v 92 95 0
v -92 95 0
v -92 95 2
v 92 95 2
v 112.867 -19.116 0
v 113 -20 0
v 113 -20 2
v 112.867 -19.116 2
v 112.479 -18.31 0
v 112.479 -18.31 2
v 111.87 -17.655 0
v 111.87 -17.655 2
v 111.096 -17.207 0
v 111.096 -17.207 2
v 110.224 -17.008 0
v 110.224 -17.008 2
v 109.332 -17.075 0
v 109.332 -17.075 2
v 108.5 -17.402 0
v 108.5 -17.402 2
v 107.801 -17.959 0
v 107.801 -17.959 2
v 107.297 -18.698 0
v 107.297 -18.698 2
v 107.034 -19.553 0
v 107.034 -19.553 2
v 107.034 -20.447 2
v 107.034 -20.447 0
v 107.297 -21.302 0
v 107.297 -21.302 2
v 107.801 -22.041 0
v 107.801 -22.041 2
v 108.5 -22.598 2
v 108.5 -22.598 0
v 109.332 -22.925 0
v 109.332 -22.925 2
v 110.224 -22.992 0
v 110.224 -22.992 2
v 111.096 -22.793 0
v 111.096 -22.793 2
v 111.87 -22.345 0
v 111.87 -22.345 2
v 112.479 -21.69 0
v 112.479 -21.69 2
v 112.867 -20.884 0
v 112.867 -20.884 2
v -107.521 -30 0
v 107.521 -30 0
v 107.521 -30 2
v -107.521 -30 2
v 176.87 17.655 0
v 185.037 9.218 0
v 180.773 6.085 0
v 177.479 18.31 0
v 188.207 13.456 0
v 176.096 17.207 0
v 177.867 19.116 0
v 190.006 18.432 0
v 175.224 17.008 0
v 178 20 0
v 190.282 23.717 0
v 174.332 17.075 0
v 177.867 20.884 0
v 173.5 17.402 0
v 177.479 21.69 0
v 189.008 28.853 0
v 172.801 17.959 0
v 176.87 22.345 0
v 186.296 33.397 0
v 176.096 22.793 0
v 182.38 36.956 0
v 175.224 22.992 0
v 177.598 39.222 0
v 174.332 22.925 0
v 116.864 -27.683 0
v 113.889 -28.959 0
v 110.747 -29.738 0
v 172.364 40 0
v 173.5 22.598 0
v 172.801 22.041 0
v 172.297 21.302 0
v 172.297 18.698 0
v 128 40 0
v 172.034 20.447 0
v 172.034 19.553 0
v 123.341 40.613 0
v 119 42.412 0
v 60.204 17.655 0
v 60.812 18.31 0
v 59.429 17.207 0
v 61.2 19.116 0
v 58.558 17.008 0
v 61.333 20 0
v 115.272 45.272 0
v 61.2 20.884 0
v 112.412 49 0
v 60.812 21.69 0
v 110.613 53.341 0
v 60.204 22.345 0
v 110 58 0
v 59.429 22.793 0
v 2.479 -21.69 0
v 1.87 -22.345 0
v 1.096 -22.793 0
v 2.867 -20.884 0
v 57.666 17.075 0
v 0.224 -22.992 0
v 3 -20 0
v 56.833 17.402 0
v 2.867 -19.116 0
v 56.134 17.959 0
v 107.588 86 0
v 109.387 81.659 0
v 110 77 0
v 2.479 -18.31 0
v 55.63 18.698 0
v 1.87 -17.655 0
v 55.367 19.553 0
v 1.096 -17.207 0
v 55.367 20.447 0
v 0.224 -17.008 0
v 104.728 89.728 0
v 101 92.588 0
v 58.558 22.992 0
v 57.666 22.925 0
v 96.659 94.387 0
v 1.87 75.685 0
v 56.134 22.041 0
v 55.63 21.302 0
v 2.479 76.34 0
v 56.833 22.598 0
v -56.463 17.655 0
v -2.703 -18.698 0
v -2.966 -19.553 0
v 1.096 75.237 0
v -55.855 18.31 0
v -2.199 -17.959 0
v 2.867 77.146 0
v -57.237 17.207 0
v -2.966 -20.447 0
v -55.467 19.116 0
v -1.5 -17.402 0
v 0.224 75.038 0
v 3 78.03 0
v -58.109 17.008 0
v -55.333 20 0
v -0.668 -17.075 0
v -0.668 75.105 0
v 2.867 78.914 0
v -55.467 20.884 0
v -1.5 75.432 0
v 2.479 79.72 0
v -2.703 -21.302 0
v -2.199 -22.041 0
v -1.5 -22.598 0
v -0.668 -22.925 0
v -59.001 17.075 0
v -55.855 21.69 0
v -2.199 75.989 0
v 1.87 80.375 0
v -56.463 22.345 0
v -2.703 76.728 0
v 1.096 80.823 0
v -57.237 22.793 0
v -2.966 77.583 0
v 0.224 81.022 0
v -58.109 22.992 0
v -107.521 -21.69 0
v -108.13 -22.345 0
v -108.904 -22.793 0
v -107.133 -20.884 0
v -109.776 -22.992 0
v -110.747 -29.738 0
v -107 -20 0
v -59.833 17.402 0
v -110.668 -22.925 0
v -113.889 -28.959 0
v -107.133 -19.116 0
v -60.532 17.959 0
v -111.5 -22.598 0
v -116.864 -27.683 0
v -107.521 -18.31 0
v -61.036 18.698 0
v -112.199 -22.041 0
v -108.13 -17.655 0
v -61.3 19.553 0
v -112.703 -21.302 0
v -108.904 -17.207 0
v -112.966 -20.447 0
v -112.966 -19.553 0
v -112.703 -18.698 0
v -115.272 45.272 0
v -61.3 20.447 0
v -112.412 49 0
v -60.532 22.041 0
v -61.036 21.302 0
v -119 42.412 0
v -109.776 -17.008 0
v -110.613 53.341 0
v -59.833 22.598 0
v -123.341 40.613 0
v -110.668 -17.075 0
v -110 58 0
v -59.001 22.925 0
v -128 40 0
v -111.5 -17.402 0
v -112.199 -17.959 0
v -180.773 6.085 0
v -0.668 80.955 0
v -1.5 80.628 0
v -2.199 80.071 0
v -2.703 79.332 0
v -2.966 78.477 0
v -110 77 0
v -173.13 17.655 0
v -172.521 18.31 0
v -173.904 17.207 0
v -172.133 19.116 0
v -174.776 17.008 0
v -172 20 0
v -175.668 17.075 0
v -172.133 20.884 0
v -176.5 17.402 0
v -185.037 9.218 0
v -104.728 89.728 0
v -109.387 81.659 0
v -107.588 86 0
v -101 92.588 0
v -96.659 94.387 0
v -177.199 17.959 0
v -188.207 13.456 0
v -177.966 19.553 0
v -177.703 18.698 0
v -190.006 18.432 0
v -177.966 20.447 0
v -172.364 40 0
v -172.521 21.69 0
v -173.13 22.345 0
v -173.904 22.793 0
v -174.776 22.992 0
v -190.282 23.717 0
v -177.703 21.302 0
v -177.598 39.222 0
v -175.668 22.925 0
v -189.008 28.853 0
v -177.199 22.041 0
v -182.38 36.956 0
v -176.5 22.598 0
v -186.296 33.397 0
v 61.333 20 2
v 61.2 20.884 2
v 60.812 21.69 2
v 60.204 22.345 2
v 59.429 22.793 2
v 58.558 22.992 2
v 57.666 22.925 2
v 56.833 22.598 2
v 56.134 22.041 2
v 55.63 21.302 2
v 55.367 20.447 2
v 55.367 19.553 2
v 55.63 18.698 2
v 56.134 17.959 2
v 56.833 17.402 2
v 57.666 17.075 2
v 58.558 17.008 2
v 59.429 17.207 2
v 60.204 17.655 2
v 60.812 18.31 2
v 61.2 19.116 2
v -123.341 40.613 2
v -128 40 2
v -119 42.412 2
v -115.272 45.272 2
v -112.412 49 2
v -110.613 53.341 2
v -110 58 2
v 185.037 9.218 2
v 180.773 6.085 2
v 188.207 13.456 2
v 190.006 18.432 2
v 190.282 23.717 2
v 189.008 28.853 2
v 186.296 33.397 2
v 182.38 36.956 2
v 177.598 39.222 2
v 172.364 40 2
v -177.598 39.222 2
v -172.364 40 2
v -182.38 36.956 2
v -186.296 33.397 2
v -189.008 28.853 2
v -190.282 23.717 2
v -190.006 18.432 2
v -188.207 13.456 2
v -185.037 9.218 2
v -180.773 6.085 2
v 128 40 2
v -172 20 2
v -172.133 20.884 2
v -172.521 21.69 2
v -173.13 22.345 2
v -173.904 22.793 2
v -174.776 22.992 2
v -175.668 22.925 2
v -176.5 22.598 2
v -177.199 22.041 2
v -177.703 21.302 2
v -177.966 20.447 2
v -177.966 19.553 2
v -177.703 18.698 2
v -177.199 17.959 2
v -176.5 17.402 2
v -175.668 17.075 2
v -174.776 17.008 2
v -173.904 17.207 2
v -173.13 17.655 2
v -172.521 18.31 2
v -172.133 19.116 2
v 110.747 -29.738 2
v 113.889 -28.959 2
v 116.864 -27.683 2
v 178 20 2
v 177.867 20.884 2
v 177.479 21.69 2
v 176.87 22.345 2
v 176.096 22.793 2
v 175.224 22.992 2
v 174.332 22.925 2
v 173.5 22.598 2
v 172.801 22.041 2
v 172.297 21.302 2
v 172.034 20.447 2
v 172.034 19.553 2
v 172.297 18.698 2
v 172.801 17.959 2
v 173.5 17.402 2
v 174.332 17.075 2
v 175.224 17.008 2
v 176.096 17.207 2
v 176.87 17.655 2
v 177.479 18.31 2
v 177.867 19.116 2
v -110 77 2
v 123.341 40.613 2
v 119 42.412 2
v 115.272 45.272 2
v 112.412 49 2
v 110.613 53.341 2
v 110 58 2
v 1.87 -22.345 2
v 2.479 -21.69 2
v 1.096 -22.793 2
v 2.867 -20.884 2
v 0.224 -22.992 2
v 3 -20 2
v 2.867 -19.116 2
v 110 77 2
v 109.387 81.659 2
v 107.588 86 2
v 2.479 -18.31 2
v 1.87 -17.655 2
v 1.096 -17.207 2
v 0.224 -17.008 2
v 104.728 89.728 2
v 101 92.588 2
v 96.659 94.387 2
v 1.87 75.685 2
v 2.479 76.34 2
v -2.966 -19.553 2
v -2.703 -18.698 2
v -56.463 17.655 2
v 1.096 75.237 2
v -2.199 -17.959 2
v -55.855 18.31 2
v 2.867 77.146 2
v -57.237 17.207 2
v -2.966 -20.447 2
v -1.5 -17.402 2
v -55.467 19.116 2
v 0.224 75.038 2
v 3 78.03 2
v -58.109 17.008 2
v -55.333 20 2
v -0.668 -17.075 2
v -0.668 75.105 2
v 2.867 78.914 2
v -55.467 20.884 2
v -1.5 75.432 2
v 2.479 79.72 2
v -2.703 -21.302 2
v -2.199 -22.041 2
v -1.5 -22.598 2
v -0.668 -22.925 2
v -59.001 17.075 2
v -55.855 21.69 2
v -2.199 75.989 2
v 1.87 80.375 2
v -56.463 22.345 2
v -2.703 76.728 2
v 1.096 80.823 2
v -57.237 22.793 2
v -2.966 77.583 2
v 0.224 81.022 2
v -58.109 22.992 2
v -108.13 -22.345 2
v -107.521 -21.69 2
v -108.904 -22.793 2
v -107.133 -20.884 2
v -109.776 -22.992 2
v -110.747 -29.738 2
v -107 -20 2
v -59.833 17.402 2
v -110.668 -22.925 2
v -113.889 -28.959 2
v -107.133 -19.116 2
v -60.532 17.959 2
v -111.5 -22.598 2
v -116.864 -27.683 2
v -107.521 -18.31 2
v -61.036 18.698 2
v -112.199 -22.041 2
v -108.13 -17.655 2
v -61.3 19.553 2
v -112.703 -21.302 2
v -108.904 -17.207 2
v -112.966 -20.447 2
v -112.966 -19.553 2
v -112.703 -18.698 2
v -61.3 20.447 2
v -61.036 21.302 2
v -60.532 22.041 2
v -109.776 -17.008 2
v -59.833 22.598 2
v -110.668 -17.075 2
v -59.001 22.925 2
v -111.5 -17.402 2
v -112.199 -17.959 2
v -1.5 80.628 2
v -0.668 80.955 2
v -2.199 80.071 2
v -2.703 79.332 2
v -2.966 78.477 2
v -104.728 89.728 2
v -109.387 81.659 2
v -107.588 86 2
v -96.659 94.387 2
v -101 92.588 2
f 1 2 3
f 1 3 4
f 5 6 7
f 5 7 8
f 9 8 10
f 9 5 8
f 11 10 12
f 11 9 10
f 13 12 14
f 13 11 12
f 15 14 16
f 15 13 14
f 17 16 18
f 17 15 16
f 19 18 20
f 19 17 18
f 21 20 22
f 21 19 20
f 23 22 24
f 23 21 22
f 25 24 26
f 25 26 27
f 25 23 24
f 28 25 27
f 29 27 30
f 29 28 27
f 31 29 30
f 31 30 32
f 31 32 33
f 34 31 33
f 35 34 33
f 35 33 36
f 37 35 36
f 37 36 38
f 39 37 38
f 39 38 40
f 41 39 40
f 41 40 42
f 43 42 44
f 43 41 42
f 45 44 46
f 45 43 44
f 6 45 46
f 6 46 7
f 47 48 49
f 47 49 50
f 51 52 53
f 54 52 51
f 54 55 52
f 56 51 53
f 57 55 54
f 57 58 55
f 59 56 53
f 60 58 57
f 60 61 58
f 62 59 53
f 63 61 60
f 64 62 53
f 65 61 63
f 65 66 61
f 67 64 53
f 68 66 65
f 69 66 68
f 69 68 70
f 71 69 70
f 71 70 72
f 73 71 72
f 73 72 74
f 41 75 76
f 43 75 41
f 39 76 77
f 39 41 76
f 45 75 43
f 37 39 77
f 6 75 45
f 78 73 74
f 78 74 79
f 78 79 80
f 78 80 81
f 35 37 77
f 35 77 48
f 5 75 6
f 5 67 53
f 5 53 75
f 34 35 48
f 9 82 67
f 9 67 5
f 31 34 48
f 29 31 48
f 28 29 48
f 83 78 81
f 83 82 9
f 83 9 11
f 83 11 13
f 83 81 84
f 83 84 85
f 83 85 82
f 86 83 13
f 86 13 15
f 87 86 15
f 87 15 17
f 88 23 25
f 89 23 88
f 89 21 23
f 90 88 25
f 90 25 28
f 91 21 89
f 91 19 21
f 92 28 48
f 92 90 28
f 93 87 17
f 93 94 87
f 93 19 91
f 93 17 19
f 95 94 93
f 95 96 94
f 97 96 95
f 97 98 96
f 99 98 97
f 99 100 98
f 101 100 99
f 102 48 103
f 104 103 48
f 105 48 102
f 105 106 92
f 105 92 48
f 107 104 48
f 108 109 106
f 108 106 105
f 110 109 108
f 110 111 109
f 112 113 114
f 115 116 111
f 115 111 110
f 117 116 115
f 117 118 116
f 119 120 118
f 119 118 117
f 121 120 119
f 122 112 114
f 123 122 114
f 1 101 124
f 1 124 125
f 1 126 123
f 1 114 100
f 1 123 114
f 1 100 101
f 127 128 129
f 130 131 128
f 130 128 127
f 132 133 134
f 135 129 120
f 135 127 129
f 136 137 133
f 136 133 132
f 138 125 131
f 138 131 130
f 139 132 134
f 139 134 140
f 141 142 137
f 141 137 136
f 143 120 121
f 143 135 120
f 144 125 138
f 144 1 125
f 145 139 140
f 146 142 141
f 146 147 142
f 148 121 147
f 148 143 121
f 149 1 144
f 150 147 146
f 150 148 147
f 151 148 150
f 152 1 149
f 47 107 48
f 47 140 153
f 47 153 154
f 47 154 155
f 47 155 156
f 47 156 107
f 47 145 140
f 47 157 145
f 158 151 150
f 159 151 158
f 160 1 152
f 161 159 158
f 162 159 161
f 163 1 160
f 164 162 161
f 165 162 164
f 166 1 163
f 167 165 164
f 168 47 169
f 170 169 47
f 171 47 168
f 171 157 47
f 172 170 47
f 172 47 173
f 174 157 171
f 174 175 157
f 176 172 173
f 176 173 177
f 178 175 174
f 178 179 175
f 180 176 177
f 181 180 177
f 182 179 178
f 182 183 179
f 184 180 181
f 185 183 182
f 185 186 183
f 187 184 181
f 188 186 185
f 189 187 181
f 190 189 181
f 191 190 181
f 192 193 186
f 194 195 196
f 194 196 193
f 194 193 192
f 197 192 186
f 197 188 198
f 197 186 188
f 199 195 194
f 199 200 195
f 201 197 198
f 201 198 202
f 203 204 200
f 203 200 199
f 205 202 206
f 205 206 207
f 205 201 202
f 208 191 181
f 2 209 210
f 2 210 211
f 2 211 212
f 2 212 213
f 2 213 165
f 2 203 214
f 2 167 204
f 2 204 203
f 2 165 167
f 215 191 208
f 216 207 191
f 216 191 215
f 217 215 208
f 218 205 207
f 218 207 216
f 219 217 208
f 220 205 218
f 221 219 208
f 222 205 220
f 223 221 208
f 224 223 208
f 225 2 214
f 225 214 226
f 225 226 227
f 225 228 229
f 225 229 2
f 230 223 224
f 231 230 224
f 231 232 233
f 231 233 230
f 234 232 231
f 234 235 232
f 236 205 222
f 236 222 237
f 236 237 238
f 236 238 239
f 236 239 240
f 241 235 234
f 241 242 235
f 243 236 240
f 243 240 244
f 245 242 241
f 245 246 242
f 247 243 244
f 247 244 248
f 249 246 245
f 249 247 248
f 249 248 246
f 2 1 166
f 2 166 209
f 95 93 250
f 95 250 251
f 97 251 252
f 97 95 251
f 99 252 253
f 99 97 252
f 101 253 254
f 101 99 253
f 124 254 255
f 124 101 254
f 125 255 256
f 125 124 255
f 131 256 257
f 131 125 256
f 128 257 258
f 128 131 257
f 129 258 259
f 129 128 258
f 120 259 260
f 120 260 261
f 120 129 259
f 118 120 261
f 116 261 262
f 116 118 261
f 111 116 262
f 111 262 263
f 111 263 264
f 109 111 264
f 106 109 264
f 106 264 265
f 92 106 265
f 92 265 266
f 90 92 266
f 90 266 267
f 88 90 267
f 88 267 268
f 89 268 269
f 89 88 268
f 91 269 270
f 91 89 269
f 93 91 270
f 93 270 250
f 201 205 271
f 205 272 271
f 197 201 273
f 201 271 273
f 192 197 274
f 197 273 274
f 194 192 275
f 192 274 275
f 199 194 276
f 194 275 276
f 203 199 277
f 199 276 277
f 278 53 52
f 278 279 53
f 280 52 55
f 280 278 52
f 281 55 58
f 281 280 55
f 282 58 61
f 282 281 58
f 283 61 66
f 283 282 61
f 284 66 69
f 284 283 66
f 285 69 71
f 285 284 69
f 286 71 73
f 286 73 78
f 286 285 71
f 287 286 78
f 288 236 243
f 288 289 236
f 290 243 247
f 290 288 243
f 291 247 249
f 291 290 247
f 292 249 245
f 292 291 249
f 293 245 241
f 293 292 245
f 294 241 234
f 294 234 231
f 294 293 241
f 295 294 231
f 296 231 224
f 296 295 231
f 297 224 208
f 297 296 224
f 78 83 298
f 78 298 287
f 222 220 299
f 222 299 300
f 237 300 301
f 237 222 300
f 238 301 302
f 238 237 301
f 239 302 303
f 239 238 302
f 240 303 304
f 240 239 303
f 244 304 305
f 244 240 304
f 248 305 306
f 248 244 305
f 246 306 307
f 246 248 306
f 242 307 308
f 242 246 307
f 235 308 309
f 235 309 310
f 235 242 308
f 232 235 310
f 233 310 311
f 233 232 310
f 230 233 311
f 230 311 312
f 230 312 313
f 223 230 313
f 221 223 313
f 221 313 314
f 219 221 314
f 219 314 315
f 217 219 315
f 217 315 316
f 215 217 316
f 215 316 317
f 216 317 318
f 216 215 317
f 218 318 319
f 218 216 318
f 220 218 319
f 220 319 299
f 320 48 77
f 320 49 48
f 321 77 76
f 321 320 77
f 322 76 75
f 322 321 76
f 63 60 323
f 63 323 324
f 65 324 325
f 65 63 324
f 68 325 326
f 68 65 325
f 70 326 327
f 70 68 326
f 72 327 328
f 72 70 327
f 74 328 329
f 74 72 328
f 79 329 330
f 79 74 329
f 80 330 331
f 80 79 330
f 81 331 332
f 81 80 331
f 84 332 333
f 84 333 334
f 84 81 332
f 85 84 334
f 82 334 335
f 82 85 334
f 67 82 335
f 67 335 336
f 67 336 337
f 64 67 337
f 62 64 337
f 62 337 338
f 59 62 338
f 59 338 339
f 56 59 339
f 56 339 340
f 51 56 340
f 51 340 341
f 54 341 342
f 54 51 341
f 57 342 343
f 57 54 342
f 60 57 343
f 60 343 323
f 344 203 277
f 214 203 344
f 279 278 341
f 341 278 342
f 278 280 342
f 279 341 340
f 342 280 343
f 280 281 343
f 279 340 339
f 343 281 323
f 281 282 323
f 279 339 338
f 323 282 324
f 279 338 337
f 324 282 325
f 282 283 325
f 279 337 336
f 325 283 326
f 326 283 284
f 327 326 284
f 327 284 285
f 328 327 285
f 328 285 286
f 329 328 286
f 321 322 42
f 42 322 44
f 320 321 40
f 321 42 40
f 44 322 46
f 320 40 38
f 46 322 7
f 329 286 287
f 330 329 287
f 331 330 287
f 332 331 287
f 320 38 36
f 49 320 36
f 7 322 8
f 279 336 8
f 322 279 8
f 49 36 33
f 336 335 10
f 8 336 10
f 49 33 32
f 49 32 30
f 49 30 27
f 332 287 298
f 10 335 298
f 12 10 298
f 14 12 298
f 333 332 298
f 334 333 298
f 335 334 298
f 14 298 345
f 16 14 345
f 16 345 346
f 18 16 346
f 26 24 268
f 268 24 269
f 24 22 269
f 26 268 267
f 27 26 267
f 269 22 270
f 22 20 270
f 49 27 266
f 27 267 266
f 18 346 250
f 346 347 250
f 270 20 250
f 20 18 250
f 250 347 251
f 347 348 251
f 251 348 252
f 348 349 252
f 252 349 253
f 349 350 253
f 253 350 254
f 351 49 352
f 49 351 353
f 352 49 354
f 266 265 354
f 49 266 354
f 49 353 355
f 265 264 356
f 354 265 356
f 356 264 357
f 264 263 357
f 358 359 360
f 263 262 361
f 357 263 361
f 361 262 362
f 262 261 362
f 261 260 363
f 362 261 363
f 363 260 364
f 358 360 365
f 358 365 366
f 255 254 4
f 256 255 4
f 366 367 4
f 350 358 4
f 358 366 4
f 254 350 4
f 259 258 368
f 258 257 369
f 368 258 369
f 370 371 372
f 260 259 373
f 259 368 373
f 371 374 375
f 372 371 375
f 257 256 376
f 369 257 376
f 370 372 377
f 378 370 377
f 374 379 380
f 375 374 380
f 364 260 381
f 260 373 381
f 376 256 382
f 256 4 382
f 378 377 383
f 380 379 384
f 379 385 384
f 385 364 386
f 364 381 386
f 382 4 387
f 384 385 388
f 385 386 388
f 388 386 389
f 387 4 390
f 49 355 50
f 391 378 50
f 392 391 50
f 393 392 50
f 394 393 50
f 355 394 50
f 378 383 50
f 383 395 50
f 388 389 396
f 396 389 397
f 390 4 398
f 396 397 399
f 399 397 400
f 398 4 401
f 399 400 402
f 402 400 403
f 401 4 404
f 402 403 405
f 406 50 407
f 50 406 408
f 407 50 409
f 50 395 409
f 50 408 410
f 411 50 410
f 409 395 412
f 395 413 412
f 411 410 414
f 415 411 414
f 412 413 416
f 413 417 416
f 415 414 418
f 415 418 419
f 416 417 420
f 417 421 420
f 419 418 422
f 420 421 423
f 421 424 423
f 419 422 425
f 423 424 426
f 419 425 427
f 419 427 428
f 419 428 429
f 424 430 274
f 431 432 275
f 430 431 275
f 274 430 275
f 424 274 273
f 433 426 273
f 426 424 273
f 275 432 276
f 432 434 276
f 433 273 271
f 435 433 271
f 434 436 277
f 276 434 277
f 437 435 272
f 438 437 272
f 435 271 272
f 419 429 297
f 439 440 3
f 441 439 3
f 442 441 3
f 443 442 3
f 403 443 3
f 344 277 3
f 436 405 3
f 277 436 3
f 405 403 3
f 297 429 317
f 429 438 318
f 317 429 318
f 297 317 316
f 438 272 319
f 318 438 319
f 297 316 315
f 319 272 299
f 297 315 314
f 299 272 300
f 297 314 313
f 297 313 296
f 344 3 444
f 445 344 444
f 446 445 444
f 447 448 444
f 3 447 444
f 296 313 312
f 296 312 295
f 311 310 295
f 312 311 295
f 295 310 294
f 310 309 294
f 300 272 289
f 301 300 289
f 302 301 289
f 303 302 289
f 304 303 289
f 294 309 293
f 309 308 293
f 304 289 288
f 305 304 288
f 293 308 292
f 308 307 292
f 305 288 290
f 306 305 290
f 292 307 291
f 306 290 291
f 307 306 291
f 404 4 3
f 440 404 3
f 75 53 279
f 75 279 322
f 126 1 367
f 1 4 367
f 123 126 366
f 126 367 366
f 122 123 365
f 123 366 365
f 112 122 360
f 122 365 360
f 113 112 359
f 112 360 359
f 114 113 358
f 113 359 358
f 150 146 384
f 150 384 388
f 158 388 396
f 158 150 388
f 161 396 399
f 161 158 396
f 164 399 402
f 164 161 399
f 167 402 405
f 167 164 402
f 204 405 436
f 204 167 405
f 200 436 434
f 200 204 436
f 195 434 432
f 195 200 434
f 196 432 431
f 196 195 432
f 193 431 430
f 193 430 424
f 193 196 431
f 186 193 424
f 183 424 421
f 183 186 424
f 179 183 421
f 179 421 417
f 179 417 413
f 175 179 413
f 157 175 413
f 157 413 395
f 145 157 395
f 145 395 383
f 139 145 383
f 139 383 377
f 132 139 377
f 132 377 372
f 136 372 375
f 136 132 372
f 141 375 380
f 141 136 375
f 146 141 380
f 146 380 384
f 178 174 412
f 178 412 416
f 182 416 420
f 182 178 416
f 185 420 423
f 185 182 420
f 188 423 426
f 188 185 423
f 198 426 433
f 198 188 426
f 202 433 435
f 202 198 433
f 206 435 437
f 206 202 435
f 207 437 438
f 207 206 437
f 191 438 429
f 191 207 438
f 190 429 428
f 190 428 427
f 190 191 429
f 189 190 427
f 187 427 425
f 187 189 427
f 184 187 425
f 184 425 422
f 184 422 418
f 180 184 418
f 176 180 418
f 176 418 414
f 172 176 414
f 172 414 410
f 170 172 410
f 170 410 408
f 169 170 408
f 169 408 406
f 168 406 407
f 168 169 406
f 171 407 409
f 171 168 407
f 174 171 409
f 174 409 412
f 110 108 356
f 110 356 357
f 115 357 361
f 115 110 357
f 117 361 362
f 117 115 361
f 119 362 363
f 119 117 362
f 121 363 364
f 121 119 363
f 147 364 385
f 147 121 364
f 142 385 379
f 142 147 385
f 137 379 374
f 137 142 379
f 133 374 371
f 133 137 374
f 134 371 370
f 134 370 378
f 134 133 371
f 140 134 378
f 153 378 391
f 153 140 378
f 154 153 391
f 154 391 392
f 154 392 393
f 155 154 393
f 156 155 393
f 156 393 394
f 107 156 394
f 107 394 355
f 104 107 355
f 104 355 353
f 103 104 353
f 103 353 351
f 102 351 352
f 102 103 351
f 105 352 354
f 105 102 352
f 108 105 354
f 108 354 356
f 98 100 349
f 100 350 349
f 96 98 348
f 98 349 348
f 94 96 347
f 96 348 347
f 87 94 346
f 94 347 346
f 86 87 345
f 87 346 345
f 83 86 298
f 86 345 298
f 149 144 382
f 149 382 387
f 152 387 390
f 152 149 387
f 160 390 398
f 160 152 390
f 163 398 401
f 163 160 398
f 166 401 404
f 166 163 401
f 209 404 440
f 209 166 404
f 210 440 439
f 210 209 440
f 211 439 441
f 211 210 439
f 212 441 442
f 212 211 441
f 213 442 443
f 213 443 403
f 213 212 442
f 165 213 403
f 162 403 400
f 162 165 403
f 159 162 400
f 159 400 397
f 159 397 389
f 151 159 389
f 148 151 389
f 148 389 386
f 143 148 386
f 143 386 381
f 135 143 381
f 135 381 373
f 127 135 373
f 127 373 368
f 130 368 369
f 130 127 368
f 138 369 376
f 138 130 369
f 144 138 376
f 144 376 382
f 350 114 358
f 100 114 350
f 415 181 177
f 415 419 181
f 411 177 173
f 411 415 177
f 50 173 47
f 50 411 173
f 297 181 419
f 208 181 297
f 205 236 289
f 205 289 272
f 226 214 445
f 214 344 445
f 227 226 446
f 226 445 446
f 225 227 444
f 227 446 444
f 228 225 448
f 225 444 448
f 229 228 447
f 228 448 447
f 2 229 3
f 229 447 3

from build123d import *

# Parameters (mm, degrees)
ESQUISSE1_R        = 3
BOSS_EXTRU_1_DEPTH = 2
CONG_1_R           = 18
CONG_2_R           = 20


with BuildPart() as part:
    # Esquisse1 → Boss.-Extru.1 (new body)
    with BuildSketch(Plane.XY):
        Polygon((-244.958991582, 40), (-110, 40), (-110, 95), (110, 95), (110, 40), (244.958991582, 40), (112.479495791, -30), (-112.479495791, -30), align=None)
        with Locations((-175, 20)):
            Circle(ESQUISSE1_R, mode=Mode.SUBTRACT)
        with Locations((-110, -20)):
            Circle(ESQUISSE1_R, mode=Mode.SUBTRACT)
        with Locations((110, -20)):
            Circle(ESQUISSE1_R, mode=Mode.SUBTRACT)
        with Locations((175, 20)):
            Circle(ESQUISSE1_R, mode=Mode.SUBTRACT)
        with Locations((0, -20)):
            Circle(ESQUISSE1_R, mode=Mode.SUBTRACT)
        with Locations((-58.333333333, 20)):
            Circle(ESQUISSE1_R, mode=Mode.SUBTRACT)
        with Locations((58.333333333, 20)):
            Circle(ESQUISSE1_R, mode=Mode.SUBTRACT)
        with Locations((0, 78.03)):
            Circle(ESQUISSE1_R, mode=Mode.SUBTRACT)
    extrude(amount=BOSS_EXTRU_1_DEPTH)

    # Congé1
    cong_1_edges = [part.edges().sort_by_distance(p)[0] for p in [
        (-244.958991582, 40, 1),
        (-110, 40, 1),
        (-110, 95, 1),
        (110, 95, 1),
        (110, 40, 1),
        (244.958991582, 40, 1),
    ]]
    fillet(cong_1_edges, radius=CONG_1_R)

    # Congé2
    cong_2_edges = [part.edges().sort_by_distance(p)[0] for p in [
        (112.479495791, -30, 1),
        (-112.479495791, -30, 1),
    ]]
    fillet(cong_2_edges, radius=CONG_2_R)


solid = part.part
